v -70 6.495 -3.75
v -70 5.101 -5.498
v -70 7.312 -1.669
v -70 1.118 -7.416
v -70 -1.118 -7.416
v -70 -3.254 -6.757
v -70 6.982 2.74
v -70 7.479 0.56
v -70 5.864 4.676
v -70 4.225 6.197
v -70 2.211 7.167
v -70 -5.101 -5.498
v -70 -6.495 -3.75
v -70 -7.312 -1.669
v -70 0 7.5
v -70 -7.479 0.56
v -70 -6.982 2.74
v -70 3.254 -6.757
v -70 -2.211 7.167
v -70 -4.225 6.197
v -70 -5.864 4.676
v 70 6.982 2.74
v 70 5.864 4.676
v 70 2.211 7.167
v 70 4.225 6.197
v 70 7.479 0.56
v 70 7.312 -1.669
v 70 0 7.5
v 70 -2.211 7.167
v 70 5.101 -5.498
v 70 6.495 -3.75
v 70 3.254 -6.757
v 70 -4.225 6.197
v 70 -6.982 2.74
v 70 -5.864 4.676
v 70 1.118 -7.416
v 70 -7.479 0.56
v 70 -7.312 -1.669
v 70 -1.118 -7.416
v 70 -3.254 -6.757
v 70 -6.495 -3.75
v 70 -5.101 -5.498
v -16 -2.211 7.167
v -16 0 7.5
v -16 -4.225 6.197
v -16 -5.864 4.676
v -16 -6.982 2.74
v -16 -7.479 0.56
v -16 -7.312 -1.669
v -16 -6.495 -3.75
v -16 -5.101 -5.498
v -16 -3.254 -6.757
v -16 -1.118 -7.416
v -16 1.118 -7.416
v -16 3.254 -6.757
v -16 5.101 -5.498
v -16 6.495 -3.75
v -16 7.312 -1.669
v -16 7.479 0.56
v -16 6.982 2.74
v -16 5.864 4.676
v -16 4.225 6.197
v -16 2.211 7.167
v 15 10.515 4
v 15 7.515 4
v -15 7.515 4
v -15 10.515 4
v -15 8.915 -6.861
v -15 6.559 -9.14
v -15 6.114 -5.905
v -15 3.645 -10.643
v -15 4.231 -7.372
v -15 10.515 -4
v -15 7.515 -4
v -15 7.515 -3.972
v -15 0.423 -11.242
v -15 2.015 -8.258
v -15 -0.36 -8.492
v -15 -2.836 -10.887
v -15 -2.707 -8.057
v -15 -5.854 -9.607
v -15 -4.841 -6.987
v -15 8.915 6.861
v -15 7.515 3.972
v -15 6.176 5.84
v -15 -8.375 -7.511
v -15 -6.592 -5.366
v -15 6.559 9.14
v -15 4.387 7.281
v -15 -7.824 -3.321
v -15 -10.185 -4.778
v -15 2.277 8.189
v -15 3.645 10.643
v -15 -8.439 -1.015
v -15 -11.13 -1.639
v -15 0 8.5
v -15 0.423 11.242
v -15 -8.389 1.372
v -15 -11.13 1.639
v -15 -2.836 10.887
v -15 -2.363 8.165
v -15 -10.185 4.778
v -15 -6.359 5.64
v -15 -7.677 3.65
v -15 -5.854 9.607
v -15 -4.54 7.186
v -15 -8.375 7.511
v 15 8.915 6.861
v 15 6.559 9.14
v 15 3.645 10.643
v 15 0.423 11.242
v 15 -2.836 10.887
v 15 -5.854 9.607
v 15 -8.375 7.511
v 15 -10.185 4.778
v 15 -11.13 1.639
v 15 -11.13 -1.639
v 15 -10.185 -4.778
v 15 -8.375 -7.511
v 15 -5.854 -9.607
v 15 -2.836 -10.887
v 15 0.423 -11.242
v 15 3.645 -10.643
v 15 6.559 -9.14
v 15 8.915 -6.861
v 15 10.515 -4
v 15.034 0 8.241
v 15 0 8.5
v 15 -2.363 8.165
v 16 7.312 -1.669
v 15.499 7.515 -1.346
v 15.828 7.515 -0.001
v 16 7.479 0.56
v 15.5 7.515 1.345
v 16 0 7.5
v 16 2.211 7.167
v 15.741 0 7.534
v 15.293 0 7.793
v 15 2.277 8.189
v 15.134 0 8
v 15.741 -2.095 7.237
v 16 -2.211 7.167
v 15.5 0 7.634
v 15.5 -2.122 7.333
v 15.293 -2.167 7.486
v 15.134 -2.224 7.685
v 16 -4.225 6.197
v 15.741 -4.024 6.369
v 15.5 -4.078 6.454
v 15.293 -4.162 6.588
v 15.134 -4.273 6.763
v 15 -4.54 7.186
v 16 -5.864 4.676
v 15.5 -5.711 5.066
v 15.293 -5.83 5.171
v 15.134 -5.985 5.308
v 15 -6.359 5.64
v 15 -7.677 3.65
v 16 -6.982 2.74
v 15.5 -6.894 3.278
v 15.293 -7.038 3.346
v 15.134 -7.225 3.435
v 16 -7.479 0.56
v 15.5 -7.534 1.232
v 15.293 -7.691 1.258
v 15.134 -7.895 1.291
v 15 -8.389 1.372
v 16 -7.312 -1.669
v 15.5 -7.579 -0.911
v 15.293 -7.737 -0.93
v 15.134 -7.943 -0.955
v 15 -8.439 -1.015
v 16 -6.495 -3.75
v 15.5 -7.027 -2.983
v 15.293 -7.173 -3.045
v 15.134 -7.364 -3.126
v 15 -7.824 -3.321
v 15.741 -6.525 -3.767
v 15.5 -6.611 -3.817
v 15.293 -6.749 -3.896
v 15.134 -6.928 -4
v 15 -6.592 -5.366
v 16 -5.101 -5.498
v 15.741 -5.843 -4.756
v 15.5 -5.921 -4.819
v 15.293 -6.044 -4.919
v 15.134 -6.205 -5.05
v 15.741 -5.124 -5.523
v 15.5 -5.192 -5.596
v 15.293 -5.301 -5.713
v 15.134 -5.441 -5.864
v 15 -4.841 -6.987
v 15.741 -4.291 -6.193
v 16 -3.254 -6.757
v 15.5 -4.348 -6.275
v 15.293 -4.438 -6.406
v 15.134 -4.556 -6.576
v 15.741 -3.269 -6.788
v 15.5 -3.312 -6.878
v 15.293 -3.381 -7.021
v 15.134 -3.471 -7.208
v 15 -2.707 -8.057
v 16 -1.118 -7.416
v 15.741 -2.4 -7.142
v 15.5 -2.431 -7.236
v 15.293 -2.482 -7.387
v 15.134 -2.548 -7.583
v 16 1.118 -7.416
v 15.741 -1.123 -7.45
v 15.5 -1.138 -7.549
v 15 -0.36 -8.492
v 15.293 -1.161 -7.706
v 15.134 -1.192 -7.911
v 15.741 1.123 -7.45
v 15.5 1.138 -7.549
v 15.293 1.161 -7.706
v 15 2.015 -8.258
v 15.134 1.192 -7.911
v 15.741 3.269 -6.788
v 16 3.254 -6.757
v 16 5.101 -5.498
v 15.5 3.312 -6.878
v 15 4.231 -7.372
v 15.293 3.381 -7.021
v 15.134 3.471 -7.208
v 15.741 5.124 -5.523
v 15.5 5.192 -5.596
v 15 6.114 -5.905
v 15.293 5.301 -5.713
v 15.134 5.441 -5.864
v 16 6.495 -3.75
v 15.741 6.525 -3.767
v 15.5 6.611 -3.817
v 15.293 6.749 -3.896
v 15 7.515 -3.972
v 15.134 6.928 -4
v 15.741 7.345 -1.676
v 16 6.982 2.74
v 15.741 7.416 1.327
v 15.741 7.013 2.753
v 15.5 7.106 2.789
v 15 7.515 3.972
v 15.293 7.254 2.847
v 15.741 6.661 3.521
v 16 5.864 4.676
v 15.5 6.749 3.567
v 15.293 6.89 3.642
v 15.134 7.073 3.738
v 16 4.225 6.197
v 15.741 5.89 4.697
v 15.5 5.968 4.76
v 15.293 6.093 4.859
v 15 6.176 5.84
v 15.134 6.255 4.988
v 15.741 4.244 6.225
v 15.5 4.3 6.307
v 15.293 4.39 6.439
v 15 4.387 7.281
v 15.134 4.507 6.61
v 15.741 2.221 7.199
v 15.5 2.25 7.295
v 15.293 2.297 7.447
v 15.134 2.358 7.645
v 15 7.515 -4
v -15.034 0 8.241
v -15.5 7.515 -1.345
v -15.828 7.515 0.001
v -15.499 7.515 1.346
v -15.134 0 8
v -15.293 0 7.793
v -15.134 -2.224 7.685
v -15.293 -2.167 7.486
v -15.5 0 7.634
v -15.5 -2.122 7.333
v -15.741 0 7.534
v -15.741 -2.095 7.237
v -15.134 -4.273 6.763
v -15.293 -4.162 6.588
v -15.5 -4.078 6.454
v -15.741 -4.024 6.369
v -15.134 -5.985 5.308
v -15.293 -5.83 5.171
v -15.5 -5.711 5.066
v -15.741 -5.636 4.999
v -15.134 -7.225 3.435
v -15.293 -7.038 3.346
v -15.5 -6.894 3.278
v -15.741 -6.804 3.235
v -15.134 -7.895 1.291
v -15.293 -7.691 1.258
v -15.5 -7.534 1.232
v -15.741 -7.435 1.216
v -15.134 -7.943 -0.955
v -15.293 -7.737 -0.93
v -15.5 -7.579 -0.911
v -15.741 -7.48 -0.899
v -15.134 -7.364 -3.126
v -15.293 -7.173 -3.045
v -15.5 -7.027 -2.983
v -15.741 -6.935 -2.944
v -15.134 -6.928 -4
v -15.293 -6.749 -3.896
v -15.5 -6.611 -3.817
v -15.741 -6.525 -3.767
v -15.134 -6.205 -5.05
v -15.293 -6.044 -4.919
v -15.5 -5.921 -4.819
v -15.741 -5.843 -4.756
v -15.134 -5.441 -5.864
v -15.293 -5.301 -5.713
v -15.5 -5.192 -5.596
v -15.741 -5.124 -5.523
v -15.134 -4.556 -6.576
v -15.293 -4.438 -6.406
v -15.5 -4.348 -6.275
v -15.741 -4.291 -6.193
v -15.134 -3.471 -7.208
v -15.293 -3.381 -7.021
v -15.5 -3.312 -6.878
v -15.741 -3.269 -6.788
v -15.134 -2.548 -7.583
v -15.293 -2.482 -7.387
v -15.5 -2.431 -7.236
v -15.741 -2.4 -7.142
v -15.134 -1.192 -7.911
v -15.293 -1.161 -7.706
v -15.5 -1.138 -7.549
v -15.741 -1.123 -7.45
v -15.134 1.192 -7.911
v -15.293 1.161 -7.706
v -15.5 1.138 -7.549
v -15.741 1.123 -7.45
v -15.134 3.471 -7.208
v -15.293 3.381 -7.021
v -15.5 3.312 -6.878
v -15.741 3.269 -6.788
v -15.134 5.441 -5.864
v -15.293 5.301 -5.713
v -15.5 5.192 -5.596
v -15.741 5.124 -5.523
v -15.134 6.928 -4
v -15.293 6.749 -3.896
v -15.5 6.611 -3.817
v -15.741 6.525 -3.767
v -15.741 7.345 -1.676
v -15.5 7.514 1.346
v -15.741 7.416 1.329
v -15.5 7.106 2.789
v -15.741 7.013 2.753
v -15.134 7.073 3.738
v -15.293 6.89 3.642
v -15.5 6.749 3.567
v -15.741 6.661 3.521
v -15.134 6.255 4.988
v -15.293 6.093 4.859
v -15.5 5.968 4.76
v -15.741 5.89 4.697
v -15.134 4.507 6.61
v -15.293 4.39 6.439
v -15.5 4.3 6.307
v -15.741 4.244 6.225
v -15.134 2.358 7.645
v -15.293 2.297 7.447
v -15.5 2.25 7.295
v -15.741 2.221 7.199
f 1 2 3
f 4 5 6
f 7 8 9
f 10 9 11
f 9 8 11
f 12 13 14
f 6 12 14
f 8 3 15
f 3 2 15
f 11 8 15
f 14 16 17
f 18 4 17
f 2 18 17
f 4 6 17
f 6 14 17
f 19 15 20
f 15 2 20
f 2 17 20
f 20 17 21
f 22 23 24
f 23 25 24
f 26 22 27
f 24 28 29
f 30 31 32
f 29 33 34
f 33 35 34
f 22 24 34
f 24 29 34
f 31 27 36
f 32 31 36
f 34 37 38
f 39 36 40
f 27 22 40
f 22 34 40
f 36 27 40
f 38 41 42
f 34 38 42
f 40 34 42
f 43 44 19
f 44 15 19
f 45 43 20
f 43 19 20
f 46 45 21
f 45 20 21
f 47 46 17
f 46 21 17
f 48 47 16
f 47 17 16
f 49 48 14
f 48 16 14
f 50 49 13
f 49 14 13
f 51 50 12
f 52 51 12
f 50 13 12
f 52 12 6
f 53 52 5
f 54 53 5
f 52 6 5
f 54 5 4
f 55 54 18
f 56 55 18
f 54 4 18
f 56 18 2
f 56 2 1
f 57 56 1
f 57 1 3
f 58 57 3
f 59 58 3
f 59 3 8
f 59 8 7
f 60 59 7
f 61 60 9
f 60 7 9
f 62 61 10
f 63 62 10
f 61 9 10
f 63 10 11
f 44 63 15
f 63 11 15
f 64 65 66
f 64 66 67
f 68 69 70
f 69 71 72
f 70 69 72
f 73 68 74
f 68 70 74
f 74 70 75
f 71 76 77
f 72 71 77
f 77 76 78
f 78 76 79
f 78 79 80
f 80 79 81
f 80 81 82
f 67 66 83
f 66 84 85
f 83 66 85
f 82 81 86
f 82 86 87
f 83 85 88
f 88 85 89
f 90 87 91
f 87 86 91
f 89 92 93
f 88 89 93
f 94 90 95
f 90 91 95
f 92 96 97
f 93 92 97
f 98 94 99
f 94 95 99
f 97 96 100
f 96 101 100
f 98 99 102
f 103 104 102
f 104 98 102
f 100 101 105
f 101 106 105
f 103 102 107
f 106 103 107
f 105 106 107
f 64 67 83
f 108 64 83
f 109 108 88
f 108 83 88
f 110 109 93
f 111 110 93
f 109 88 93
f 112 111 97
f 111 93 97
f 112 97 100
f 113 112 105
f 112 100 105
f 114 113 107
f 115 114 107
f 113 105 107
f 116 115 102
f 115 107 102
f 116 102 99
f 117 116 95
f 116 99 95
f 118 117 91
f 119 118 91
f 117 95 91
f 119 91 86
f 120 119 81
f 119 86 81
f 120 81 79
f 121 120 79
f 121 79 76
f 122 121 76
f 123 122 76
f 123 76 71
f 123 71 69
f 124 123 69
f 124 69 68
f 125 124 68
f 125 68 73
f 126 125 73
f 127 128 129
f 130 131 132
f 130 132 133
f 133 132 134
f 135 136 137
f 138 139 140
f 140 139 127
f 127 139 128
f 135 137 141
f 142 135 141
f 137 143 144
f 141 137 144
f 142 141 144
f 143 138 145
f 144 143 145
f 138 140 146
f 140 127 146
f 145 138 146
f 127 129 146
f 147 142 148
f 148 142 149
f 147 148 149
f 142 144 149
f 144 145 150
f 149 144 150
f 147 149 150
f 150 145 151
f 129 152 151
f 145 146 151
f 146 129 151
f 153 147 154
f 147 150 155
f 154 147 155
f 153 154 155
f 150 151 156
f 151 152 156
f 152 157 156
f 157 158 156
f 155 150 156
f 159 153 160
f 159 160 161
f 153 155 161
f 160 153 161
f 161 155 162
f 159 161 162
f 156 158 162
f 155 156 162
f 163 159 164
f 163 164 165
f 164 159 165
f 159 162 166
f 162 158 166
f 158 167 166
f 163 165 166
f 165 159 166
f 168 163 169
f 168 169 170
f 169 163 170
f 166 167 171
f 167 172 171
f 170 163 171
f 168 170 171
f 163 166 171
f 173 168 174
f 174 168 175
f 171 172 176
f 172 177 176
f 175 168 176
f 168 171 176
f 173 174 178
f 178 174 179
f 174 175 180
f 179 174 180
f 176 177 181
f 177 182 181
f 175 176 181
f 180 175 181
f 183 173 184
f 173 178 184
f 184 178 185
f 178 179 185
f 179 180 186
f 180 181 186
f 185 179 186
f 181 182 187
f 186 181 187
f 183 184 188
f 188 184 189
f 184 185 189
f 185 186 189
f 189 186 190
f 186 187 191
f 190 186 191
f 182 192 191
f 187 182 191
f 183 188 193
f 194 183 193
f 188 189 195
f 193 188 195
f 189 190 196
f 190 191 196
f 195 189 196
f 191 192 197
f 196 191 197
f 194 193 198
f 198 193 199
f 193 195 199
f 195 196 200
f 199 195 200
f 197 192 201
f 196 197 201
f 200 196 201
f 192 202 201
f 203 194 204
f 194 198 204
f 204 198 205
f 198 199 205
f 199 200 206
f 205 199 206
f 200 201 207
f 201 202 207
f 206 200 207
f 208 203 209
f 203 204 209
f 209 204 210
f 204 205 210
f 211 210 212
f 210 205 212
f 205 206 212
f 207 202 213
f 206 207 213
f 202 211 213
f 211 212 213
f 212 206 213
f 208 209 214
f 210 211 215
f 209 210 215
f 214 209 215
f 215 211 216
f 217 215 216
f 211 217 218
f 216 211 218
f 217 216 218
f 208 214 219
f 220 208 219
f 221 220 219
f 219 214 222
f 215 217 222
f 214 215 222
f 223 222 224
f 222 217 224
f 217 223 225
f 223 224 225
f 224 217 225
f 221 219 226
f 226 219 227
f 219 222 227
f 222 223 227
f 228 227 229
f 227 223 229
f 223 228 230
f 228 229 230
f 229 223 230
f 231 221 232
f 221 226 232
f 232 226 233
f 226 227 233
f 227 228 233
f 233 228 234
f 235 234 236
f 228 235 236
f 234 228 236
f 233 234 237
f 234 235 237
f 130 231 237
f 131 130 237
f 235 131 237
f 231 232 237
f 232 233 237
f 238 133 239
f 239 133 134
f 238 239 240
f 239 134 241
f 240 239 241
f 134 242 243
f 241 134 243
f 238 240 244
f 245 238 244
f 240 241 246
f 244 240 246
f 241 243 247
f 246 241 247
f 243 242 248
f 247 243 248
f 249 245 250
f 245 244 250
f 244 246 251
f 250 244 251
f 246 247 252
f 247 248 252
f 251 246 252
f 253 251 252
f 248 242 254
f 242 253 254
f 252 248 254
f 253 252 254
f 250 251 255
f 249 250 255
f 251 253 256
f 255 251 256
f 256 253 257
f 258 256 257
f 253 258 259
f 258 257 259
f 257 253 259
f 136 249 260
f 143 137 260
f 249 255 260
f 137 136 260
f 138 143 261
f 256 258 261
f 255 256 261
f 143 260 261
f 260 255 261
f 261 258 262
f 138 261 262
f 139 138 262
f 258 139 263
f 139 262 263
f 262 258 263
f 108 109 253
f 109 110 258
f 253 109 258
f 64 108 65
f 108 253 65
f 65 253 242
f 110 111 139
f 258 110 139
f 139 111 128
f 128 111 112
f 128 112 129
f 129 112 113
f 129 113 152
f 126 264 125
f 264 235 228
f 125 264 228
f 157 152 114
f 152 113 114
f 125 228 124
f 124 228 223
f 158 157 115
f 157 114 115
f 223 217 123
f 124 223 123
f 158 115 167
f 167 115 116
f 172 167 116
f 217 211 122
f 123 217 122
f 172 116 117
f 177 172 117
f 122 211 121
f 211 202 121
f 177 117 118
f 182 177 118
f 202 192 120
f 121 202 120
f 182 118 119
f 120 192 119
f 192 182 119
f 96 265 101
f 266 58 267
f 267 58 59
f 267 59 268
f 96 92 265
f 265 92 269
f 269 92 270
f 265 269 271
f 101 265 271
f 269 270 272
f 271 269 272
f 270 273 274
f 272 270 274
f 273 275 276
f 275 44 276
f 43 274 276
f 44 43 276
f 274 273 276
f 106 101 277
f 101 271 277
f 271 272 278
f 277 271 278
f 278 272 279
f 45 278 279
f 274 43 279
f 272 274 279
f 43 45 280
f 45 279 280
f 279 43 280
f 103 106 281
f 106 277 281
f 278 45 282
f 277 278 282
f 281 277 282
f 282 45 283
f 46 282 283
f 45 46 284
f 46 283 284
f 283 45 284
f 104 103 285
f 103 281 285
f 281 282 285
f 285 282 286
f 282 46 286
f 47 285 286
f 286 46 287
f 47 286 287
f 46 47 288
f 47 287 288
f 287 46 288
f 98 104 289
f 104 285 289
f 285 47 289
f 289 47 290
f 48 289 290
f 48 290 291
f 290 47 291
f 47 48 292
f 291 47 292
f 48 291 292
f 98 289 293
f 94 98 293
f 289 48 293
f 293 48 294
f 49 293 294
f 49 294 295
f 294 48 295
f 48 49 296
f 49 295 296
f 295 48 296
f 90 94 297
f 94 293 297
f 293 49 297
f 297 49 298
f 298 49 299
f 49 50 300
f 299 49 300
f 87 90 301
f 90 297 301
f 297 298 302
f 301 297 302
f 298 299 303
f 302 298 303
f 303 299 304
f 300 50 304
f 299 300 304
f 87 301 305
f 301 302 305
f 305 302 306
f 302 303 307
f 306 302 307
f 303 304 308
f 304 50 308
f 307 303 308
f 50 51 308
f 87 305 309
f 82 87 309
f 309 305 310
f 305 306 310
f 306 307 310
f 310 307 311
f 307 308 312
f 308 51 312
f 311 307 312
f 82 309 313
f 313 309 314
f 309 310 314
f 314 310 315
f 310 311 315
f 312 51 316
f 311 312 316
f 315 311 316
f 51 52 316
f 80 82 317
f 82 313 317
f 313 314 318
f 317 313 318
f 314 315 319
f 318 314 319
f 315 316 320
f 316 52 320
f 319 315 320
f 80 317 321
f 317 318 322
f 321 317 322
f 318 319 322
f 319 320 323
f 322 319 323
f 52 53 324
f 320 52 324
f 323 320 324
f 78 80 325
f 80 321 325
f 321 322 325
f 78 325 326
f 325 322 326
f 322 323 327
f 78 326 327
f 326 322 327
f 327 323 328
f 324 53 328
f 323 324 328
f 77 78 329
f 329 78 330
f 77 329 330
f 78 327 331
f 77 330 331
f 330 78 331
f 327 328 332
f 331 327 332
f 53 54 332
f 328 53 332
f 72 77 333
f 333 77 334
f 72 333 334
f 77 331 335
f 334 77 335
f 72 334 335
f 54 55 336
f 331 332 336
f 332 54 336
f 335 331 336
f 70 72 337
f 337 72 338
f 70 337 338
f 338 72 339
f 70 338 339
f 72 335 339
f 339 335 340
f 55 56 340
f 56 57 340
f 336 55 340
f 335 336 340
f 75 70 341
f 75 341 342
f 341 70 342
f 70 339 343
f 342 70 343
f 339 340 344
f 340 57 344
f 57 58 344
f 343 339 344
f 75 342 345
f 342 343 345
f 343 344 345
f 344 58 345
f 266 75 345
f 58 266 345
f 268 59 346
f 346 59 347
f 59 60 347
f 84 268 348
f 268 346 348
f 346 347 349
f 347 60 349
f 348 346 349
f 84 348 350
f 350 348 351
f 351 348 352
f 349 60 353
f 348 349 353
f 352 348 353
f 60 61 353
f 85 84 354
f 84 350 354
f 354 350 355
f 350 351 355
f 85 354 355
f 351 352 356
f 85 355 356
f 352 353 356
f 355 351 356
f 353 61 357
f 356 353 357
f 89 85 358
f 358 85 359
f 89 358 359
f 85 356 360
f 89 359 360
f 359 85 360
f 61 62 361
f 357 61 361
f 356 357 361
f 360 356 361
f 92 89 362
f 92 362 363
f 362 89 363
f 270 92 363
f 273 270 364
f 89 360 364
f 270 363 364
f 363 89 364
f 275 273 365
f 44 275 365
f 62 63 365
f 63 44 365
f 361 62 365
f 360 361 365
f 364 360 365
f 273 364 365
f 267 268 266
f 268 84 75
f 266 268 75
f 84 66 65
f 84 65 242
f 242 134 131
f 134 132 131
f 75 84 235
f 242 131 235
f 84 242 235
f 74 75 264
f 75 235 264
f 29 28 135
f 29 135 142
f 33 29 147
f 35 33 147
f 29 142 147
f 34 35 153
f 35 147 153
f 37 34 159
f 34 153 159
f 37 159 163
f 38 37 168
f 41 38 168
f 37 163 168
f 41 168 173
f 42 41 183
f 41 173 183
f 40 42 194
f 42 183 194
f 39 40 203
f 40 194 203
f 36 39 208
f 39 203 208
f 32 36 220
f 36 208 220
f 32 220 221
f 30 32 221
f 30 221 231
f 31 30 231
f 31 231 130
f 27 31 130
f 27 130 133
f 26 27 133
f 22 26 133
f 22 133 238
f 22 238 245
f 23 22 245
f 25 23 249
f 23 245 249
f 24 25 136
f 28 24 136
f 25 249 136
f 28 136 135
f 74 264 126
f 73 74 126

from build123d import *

# Parameters (mm, degrees)
CUT_EXTRUDE1_DEPTH      = 72.785270077
CUT_EXTRUDE1_DEPTH_BACK = 72.785270077
SKETCH4_W               = 4
SKETCH4_H               = 3
FILLET5_R               = 1
FILLET6_R               = 1


with BuildPart() as part:
    # Sketch1 → Revolve1 (revolve)
    with BuildSketch(Plane.XY, mode=Mode.PRIVATE) as revolve1_sk:
        Polygon((0, 0), (70, 0), (70, 7.5), (15, 7.5), (15, 11.25), (-15, 11.25), (-15, 7.5), (-70, 7.5), (-70, 0), align=None)
    revolve(revolve1_sk.sketch.rotate(Axis((0, 0, 0), (1, 0, 0)), 90), axis=Axis((0, 0, 0), (1, 0, 0)))

    # Sketch4 → Cut-Extrude1 (cut, two sides: drawn at the far end of the back side and taken through both)
    with BuildSketch(Plane(origin=(0, 0, 0), x_dir=(0, 0, -1), z_dir=(1, 0, 0)).offset(-CUT_EXTRUDE1_DEPTH_BACK)):
        with Locations((2, 9.014870422)):
            Rectangle(SKETCH4_W, SKETCH4_H)
        with Locations((-2, 9.014870422)):
            Rectangle(SKETCH4_W, SKETCH4_H)
        with BuildLine():
            Line((0, 11.25), (0, 10.514870422))
            Line((0, 10.514870422), (4, 10.514870422))
            ThreePointArc((4, 10.514870422), (2.033495482, 11.064691416), (0, 11.25))
        make_face()
        with BuildLine():
            Line((-4, 10.514870422), (0, 10.514870422))
            Line((0, 10.514870422), (0, 11.25))
            ThreePointArc((0, 11.25), (-2.033495482, 11.064691416), (-4, 10.514870422))
        make_face()
    extrude(amount=CUT_EXTRUDE1_DEPTH + CUT_EXTRUDE1_DEPTH_BACK, mode=Mode.SUBTRACT)

    # Fillet5
    # the kernel refuses this fillet: 1 mm, written as the material it adds along each edge
    with BuildSketch(Plane(origin=(-15, 0, 0), x_dir=(0, 0, 1), z_dir=(0, 1, 0))) as fillet5_piece_1_section:
        with BuildLine():
            CenterArc((7.5 + FILLET5_R, -FILLET5_R), FILLET5_R, 90, 90)
            Line((7.5, -FILLET5_R), (7.5, 0))
            Line((7.5, 0), (7.5 + FILLET5_R, 0))
        make_face()
    fillet5_piece_1 = revolve(axis=Axis((-15, 0, 0), (1, 0, 0)), mode=Mode.PRIVATE)
    fillet5_piece_1 = split(fillet5_piece_1, bisect_by=Plane(origin=(-15.276890307, 7.514870422, -7.776890307), z_dir=(0, -1, 0)), keep=Keep.TOP, mode=Mode.PRIVATE)
    add(fillet5_piece_1)

    # Fillet6
    # the kernel refuses this fillet: 1 mm, written as the material it adds along each edge
    with BuildSketch(Plane(origin=(15, 0, 0), x_dir=(0, 0, 1), z_dir=(0, 1, 0))) as fillet6_piece_1_section:
        with BuildLine():
            CenterArc((7.5 + FILLET6_R, FILLET6_R), FILLET6_R, 180, 90)
            Line((7.5, FILLET6_R), (7.5, 0))
            Line((7.5, 0), (7.5 + FILLET6_R, 0))
        make_face()
    fillet6_piece_1 = revolve(axis=Axis((15, 0, 0), (1, 0, 0)), mode=Mode.PRIVATE)
    fillet6_piece_1 = split(fillet6_piece_1, bisect_by=Plane(origin=(15.276890307, 7.514870422, -7.776890307), z_dir=(0, -1, 0)), keep=Keep.TOP, mode=Mode.PRIVATE)
    add(fillet6_piece_1)


solid = part.part
